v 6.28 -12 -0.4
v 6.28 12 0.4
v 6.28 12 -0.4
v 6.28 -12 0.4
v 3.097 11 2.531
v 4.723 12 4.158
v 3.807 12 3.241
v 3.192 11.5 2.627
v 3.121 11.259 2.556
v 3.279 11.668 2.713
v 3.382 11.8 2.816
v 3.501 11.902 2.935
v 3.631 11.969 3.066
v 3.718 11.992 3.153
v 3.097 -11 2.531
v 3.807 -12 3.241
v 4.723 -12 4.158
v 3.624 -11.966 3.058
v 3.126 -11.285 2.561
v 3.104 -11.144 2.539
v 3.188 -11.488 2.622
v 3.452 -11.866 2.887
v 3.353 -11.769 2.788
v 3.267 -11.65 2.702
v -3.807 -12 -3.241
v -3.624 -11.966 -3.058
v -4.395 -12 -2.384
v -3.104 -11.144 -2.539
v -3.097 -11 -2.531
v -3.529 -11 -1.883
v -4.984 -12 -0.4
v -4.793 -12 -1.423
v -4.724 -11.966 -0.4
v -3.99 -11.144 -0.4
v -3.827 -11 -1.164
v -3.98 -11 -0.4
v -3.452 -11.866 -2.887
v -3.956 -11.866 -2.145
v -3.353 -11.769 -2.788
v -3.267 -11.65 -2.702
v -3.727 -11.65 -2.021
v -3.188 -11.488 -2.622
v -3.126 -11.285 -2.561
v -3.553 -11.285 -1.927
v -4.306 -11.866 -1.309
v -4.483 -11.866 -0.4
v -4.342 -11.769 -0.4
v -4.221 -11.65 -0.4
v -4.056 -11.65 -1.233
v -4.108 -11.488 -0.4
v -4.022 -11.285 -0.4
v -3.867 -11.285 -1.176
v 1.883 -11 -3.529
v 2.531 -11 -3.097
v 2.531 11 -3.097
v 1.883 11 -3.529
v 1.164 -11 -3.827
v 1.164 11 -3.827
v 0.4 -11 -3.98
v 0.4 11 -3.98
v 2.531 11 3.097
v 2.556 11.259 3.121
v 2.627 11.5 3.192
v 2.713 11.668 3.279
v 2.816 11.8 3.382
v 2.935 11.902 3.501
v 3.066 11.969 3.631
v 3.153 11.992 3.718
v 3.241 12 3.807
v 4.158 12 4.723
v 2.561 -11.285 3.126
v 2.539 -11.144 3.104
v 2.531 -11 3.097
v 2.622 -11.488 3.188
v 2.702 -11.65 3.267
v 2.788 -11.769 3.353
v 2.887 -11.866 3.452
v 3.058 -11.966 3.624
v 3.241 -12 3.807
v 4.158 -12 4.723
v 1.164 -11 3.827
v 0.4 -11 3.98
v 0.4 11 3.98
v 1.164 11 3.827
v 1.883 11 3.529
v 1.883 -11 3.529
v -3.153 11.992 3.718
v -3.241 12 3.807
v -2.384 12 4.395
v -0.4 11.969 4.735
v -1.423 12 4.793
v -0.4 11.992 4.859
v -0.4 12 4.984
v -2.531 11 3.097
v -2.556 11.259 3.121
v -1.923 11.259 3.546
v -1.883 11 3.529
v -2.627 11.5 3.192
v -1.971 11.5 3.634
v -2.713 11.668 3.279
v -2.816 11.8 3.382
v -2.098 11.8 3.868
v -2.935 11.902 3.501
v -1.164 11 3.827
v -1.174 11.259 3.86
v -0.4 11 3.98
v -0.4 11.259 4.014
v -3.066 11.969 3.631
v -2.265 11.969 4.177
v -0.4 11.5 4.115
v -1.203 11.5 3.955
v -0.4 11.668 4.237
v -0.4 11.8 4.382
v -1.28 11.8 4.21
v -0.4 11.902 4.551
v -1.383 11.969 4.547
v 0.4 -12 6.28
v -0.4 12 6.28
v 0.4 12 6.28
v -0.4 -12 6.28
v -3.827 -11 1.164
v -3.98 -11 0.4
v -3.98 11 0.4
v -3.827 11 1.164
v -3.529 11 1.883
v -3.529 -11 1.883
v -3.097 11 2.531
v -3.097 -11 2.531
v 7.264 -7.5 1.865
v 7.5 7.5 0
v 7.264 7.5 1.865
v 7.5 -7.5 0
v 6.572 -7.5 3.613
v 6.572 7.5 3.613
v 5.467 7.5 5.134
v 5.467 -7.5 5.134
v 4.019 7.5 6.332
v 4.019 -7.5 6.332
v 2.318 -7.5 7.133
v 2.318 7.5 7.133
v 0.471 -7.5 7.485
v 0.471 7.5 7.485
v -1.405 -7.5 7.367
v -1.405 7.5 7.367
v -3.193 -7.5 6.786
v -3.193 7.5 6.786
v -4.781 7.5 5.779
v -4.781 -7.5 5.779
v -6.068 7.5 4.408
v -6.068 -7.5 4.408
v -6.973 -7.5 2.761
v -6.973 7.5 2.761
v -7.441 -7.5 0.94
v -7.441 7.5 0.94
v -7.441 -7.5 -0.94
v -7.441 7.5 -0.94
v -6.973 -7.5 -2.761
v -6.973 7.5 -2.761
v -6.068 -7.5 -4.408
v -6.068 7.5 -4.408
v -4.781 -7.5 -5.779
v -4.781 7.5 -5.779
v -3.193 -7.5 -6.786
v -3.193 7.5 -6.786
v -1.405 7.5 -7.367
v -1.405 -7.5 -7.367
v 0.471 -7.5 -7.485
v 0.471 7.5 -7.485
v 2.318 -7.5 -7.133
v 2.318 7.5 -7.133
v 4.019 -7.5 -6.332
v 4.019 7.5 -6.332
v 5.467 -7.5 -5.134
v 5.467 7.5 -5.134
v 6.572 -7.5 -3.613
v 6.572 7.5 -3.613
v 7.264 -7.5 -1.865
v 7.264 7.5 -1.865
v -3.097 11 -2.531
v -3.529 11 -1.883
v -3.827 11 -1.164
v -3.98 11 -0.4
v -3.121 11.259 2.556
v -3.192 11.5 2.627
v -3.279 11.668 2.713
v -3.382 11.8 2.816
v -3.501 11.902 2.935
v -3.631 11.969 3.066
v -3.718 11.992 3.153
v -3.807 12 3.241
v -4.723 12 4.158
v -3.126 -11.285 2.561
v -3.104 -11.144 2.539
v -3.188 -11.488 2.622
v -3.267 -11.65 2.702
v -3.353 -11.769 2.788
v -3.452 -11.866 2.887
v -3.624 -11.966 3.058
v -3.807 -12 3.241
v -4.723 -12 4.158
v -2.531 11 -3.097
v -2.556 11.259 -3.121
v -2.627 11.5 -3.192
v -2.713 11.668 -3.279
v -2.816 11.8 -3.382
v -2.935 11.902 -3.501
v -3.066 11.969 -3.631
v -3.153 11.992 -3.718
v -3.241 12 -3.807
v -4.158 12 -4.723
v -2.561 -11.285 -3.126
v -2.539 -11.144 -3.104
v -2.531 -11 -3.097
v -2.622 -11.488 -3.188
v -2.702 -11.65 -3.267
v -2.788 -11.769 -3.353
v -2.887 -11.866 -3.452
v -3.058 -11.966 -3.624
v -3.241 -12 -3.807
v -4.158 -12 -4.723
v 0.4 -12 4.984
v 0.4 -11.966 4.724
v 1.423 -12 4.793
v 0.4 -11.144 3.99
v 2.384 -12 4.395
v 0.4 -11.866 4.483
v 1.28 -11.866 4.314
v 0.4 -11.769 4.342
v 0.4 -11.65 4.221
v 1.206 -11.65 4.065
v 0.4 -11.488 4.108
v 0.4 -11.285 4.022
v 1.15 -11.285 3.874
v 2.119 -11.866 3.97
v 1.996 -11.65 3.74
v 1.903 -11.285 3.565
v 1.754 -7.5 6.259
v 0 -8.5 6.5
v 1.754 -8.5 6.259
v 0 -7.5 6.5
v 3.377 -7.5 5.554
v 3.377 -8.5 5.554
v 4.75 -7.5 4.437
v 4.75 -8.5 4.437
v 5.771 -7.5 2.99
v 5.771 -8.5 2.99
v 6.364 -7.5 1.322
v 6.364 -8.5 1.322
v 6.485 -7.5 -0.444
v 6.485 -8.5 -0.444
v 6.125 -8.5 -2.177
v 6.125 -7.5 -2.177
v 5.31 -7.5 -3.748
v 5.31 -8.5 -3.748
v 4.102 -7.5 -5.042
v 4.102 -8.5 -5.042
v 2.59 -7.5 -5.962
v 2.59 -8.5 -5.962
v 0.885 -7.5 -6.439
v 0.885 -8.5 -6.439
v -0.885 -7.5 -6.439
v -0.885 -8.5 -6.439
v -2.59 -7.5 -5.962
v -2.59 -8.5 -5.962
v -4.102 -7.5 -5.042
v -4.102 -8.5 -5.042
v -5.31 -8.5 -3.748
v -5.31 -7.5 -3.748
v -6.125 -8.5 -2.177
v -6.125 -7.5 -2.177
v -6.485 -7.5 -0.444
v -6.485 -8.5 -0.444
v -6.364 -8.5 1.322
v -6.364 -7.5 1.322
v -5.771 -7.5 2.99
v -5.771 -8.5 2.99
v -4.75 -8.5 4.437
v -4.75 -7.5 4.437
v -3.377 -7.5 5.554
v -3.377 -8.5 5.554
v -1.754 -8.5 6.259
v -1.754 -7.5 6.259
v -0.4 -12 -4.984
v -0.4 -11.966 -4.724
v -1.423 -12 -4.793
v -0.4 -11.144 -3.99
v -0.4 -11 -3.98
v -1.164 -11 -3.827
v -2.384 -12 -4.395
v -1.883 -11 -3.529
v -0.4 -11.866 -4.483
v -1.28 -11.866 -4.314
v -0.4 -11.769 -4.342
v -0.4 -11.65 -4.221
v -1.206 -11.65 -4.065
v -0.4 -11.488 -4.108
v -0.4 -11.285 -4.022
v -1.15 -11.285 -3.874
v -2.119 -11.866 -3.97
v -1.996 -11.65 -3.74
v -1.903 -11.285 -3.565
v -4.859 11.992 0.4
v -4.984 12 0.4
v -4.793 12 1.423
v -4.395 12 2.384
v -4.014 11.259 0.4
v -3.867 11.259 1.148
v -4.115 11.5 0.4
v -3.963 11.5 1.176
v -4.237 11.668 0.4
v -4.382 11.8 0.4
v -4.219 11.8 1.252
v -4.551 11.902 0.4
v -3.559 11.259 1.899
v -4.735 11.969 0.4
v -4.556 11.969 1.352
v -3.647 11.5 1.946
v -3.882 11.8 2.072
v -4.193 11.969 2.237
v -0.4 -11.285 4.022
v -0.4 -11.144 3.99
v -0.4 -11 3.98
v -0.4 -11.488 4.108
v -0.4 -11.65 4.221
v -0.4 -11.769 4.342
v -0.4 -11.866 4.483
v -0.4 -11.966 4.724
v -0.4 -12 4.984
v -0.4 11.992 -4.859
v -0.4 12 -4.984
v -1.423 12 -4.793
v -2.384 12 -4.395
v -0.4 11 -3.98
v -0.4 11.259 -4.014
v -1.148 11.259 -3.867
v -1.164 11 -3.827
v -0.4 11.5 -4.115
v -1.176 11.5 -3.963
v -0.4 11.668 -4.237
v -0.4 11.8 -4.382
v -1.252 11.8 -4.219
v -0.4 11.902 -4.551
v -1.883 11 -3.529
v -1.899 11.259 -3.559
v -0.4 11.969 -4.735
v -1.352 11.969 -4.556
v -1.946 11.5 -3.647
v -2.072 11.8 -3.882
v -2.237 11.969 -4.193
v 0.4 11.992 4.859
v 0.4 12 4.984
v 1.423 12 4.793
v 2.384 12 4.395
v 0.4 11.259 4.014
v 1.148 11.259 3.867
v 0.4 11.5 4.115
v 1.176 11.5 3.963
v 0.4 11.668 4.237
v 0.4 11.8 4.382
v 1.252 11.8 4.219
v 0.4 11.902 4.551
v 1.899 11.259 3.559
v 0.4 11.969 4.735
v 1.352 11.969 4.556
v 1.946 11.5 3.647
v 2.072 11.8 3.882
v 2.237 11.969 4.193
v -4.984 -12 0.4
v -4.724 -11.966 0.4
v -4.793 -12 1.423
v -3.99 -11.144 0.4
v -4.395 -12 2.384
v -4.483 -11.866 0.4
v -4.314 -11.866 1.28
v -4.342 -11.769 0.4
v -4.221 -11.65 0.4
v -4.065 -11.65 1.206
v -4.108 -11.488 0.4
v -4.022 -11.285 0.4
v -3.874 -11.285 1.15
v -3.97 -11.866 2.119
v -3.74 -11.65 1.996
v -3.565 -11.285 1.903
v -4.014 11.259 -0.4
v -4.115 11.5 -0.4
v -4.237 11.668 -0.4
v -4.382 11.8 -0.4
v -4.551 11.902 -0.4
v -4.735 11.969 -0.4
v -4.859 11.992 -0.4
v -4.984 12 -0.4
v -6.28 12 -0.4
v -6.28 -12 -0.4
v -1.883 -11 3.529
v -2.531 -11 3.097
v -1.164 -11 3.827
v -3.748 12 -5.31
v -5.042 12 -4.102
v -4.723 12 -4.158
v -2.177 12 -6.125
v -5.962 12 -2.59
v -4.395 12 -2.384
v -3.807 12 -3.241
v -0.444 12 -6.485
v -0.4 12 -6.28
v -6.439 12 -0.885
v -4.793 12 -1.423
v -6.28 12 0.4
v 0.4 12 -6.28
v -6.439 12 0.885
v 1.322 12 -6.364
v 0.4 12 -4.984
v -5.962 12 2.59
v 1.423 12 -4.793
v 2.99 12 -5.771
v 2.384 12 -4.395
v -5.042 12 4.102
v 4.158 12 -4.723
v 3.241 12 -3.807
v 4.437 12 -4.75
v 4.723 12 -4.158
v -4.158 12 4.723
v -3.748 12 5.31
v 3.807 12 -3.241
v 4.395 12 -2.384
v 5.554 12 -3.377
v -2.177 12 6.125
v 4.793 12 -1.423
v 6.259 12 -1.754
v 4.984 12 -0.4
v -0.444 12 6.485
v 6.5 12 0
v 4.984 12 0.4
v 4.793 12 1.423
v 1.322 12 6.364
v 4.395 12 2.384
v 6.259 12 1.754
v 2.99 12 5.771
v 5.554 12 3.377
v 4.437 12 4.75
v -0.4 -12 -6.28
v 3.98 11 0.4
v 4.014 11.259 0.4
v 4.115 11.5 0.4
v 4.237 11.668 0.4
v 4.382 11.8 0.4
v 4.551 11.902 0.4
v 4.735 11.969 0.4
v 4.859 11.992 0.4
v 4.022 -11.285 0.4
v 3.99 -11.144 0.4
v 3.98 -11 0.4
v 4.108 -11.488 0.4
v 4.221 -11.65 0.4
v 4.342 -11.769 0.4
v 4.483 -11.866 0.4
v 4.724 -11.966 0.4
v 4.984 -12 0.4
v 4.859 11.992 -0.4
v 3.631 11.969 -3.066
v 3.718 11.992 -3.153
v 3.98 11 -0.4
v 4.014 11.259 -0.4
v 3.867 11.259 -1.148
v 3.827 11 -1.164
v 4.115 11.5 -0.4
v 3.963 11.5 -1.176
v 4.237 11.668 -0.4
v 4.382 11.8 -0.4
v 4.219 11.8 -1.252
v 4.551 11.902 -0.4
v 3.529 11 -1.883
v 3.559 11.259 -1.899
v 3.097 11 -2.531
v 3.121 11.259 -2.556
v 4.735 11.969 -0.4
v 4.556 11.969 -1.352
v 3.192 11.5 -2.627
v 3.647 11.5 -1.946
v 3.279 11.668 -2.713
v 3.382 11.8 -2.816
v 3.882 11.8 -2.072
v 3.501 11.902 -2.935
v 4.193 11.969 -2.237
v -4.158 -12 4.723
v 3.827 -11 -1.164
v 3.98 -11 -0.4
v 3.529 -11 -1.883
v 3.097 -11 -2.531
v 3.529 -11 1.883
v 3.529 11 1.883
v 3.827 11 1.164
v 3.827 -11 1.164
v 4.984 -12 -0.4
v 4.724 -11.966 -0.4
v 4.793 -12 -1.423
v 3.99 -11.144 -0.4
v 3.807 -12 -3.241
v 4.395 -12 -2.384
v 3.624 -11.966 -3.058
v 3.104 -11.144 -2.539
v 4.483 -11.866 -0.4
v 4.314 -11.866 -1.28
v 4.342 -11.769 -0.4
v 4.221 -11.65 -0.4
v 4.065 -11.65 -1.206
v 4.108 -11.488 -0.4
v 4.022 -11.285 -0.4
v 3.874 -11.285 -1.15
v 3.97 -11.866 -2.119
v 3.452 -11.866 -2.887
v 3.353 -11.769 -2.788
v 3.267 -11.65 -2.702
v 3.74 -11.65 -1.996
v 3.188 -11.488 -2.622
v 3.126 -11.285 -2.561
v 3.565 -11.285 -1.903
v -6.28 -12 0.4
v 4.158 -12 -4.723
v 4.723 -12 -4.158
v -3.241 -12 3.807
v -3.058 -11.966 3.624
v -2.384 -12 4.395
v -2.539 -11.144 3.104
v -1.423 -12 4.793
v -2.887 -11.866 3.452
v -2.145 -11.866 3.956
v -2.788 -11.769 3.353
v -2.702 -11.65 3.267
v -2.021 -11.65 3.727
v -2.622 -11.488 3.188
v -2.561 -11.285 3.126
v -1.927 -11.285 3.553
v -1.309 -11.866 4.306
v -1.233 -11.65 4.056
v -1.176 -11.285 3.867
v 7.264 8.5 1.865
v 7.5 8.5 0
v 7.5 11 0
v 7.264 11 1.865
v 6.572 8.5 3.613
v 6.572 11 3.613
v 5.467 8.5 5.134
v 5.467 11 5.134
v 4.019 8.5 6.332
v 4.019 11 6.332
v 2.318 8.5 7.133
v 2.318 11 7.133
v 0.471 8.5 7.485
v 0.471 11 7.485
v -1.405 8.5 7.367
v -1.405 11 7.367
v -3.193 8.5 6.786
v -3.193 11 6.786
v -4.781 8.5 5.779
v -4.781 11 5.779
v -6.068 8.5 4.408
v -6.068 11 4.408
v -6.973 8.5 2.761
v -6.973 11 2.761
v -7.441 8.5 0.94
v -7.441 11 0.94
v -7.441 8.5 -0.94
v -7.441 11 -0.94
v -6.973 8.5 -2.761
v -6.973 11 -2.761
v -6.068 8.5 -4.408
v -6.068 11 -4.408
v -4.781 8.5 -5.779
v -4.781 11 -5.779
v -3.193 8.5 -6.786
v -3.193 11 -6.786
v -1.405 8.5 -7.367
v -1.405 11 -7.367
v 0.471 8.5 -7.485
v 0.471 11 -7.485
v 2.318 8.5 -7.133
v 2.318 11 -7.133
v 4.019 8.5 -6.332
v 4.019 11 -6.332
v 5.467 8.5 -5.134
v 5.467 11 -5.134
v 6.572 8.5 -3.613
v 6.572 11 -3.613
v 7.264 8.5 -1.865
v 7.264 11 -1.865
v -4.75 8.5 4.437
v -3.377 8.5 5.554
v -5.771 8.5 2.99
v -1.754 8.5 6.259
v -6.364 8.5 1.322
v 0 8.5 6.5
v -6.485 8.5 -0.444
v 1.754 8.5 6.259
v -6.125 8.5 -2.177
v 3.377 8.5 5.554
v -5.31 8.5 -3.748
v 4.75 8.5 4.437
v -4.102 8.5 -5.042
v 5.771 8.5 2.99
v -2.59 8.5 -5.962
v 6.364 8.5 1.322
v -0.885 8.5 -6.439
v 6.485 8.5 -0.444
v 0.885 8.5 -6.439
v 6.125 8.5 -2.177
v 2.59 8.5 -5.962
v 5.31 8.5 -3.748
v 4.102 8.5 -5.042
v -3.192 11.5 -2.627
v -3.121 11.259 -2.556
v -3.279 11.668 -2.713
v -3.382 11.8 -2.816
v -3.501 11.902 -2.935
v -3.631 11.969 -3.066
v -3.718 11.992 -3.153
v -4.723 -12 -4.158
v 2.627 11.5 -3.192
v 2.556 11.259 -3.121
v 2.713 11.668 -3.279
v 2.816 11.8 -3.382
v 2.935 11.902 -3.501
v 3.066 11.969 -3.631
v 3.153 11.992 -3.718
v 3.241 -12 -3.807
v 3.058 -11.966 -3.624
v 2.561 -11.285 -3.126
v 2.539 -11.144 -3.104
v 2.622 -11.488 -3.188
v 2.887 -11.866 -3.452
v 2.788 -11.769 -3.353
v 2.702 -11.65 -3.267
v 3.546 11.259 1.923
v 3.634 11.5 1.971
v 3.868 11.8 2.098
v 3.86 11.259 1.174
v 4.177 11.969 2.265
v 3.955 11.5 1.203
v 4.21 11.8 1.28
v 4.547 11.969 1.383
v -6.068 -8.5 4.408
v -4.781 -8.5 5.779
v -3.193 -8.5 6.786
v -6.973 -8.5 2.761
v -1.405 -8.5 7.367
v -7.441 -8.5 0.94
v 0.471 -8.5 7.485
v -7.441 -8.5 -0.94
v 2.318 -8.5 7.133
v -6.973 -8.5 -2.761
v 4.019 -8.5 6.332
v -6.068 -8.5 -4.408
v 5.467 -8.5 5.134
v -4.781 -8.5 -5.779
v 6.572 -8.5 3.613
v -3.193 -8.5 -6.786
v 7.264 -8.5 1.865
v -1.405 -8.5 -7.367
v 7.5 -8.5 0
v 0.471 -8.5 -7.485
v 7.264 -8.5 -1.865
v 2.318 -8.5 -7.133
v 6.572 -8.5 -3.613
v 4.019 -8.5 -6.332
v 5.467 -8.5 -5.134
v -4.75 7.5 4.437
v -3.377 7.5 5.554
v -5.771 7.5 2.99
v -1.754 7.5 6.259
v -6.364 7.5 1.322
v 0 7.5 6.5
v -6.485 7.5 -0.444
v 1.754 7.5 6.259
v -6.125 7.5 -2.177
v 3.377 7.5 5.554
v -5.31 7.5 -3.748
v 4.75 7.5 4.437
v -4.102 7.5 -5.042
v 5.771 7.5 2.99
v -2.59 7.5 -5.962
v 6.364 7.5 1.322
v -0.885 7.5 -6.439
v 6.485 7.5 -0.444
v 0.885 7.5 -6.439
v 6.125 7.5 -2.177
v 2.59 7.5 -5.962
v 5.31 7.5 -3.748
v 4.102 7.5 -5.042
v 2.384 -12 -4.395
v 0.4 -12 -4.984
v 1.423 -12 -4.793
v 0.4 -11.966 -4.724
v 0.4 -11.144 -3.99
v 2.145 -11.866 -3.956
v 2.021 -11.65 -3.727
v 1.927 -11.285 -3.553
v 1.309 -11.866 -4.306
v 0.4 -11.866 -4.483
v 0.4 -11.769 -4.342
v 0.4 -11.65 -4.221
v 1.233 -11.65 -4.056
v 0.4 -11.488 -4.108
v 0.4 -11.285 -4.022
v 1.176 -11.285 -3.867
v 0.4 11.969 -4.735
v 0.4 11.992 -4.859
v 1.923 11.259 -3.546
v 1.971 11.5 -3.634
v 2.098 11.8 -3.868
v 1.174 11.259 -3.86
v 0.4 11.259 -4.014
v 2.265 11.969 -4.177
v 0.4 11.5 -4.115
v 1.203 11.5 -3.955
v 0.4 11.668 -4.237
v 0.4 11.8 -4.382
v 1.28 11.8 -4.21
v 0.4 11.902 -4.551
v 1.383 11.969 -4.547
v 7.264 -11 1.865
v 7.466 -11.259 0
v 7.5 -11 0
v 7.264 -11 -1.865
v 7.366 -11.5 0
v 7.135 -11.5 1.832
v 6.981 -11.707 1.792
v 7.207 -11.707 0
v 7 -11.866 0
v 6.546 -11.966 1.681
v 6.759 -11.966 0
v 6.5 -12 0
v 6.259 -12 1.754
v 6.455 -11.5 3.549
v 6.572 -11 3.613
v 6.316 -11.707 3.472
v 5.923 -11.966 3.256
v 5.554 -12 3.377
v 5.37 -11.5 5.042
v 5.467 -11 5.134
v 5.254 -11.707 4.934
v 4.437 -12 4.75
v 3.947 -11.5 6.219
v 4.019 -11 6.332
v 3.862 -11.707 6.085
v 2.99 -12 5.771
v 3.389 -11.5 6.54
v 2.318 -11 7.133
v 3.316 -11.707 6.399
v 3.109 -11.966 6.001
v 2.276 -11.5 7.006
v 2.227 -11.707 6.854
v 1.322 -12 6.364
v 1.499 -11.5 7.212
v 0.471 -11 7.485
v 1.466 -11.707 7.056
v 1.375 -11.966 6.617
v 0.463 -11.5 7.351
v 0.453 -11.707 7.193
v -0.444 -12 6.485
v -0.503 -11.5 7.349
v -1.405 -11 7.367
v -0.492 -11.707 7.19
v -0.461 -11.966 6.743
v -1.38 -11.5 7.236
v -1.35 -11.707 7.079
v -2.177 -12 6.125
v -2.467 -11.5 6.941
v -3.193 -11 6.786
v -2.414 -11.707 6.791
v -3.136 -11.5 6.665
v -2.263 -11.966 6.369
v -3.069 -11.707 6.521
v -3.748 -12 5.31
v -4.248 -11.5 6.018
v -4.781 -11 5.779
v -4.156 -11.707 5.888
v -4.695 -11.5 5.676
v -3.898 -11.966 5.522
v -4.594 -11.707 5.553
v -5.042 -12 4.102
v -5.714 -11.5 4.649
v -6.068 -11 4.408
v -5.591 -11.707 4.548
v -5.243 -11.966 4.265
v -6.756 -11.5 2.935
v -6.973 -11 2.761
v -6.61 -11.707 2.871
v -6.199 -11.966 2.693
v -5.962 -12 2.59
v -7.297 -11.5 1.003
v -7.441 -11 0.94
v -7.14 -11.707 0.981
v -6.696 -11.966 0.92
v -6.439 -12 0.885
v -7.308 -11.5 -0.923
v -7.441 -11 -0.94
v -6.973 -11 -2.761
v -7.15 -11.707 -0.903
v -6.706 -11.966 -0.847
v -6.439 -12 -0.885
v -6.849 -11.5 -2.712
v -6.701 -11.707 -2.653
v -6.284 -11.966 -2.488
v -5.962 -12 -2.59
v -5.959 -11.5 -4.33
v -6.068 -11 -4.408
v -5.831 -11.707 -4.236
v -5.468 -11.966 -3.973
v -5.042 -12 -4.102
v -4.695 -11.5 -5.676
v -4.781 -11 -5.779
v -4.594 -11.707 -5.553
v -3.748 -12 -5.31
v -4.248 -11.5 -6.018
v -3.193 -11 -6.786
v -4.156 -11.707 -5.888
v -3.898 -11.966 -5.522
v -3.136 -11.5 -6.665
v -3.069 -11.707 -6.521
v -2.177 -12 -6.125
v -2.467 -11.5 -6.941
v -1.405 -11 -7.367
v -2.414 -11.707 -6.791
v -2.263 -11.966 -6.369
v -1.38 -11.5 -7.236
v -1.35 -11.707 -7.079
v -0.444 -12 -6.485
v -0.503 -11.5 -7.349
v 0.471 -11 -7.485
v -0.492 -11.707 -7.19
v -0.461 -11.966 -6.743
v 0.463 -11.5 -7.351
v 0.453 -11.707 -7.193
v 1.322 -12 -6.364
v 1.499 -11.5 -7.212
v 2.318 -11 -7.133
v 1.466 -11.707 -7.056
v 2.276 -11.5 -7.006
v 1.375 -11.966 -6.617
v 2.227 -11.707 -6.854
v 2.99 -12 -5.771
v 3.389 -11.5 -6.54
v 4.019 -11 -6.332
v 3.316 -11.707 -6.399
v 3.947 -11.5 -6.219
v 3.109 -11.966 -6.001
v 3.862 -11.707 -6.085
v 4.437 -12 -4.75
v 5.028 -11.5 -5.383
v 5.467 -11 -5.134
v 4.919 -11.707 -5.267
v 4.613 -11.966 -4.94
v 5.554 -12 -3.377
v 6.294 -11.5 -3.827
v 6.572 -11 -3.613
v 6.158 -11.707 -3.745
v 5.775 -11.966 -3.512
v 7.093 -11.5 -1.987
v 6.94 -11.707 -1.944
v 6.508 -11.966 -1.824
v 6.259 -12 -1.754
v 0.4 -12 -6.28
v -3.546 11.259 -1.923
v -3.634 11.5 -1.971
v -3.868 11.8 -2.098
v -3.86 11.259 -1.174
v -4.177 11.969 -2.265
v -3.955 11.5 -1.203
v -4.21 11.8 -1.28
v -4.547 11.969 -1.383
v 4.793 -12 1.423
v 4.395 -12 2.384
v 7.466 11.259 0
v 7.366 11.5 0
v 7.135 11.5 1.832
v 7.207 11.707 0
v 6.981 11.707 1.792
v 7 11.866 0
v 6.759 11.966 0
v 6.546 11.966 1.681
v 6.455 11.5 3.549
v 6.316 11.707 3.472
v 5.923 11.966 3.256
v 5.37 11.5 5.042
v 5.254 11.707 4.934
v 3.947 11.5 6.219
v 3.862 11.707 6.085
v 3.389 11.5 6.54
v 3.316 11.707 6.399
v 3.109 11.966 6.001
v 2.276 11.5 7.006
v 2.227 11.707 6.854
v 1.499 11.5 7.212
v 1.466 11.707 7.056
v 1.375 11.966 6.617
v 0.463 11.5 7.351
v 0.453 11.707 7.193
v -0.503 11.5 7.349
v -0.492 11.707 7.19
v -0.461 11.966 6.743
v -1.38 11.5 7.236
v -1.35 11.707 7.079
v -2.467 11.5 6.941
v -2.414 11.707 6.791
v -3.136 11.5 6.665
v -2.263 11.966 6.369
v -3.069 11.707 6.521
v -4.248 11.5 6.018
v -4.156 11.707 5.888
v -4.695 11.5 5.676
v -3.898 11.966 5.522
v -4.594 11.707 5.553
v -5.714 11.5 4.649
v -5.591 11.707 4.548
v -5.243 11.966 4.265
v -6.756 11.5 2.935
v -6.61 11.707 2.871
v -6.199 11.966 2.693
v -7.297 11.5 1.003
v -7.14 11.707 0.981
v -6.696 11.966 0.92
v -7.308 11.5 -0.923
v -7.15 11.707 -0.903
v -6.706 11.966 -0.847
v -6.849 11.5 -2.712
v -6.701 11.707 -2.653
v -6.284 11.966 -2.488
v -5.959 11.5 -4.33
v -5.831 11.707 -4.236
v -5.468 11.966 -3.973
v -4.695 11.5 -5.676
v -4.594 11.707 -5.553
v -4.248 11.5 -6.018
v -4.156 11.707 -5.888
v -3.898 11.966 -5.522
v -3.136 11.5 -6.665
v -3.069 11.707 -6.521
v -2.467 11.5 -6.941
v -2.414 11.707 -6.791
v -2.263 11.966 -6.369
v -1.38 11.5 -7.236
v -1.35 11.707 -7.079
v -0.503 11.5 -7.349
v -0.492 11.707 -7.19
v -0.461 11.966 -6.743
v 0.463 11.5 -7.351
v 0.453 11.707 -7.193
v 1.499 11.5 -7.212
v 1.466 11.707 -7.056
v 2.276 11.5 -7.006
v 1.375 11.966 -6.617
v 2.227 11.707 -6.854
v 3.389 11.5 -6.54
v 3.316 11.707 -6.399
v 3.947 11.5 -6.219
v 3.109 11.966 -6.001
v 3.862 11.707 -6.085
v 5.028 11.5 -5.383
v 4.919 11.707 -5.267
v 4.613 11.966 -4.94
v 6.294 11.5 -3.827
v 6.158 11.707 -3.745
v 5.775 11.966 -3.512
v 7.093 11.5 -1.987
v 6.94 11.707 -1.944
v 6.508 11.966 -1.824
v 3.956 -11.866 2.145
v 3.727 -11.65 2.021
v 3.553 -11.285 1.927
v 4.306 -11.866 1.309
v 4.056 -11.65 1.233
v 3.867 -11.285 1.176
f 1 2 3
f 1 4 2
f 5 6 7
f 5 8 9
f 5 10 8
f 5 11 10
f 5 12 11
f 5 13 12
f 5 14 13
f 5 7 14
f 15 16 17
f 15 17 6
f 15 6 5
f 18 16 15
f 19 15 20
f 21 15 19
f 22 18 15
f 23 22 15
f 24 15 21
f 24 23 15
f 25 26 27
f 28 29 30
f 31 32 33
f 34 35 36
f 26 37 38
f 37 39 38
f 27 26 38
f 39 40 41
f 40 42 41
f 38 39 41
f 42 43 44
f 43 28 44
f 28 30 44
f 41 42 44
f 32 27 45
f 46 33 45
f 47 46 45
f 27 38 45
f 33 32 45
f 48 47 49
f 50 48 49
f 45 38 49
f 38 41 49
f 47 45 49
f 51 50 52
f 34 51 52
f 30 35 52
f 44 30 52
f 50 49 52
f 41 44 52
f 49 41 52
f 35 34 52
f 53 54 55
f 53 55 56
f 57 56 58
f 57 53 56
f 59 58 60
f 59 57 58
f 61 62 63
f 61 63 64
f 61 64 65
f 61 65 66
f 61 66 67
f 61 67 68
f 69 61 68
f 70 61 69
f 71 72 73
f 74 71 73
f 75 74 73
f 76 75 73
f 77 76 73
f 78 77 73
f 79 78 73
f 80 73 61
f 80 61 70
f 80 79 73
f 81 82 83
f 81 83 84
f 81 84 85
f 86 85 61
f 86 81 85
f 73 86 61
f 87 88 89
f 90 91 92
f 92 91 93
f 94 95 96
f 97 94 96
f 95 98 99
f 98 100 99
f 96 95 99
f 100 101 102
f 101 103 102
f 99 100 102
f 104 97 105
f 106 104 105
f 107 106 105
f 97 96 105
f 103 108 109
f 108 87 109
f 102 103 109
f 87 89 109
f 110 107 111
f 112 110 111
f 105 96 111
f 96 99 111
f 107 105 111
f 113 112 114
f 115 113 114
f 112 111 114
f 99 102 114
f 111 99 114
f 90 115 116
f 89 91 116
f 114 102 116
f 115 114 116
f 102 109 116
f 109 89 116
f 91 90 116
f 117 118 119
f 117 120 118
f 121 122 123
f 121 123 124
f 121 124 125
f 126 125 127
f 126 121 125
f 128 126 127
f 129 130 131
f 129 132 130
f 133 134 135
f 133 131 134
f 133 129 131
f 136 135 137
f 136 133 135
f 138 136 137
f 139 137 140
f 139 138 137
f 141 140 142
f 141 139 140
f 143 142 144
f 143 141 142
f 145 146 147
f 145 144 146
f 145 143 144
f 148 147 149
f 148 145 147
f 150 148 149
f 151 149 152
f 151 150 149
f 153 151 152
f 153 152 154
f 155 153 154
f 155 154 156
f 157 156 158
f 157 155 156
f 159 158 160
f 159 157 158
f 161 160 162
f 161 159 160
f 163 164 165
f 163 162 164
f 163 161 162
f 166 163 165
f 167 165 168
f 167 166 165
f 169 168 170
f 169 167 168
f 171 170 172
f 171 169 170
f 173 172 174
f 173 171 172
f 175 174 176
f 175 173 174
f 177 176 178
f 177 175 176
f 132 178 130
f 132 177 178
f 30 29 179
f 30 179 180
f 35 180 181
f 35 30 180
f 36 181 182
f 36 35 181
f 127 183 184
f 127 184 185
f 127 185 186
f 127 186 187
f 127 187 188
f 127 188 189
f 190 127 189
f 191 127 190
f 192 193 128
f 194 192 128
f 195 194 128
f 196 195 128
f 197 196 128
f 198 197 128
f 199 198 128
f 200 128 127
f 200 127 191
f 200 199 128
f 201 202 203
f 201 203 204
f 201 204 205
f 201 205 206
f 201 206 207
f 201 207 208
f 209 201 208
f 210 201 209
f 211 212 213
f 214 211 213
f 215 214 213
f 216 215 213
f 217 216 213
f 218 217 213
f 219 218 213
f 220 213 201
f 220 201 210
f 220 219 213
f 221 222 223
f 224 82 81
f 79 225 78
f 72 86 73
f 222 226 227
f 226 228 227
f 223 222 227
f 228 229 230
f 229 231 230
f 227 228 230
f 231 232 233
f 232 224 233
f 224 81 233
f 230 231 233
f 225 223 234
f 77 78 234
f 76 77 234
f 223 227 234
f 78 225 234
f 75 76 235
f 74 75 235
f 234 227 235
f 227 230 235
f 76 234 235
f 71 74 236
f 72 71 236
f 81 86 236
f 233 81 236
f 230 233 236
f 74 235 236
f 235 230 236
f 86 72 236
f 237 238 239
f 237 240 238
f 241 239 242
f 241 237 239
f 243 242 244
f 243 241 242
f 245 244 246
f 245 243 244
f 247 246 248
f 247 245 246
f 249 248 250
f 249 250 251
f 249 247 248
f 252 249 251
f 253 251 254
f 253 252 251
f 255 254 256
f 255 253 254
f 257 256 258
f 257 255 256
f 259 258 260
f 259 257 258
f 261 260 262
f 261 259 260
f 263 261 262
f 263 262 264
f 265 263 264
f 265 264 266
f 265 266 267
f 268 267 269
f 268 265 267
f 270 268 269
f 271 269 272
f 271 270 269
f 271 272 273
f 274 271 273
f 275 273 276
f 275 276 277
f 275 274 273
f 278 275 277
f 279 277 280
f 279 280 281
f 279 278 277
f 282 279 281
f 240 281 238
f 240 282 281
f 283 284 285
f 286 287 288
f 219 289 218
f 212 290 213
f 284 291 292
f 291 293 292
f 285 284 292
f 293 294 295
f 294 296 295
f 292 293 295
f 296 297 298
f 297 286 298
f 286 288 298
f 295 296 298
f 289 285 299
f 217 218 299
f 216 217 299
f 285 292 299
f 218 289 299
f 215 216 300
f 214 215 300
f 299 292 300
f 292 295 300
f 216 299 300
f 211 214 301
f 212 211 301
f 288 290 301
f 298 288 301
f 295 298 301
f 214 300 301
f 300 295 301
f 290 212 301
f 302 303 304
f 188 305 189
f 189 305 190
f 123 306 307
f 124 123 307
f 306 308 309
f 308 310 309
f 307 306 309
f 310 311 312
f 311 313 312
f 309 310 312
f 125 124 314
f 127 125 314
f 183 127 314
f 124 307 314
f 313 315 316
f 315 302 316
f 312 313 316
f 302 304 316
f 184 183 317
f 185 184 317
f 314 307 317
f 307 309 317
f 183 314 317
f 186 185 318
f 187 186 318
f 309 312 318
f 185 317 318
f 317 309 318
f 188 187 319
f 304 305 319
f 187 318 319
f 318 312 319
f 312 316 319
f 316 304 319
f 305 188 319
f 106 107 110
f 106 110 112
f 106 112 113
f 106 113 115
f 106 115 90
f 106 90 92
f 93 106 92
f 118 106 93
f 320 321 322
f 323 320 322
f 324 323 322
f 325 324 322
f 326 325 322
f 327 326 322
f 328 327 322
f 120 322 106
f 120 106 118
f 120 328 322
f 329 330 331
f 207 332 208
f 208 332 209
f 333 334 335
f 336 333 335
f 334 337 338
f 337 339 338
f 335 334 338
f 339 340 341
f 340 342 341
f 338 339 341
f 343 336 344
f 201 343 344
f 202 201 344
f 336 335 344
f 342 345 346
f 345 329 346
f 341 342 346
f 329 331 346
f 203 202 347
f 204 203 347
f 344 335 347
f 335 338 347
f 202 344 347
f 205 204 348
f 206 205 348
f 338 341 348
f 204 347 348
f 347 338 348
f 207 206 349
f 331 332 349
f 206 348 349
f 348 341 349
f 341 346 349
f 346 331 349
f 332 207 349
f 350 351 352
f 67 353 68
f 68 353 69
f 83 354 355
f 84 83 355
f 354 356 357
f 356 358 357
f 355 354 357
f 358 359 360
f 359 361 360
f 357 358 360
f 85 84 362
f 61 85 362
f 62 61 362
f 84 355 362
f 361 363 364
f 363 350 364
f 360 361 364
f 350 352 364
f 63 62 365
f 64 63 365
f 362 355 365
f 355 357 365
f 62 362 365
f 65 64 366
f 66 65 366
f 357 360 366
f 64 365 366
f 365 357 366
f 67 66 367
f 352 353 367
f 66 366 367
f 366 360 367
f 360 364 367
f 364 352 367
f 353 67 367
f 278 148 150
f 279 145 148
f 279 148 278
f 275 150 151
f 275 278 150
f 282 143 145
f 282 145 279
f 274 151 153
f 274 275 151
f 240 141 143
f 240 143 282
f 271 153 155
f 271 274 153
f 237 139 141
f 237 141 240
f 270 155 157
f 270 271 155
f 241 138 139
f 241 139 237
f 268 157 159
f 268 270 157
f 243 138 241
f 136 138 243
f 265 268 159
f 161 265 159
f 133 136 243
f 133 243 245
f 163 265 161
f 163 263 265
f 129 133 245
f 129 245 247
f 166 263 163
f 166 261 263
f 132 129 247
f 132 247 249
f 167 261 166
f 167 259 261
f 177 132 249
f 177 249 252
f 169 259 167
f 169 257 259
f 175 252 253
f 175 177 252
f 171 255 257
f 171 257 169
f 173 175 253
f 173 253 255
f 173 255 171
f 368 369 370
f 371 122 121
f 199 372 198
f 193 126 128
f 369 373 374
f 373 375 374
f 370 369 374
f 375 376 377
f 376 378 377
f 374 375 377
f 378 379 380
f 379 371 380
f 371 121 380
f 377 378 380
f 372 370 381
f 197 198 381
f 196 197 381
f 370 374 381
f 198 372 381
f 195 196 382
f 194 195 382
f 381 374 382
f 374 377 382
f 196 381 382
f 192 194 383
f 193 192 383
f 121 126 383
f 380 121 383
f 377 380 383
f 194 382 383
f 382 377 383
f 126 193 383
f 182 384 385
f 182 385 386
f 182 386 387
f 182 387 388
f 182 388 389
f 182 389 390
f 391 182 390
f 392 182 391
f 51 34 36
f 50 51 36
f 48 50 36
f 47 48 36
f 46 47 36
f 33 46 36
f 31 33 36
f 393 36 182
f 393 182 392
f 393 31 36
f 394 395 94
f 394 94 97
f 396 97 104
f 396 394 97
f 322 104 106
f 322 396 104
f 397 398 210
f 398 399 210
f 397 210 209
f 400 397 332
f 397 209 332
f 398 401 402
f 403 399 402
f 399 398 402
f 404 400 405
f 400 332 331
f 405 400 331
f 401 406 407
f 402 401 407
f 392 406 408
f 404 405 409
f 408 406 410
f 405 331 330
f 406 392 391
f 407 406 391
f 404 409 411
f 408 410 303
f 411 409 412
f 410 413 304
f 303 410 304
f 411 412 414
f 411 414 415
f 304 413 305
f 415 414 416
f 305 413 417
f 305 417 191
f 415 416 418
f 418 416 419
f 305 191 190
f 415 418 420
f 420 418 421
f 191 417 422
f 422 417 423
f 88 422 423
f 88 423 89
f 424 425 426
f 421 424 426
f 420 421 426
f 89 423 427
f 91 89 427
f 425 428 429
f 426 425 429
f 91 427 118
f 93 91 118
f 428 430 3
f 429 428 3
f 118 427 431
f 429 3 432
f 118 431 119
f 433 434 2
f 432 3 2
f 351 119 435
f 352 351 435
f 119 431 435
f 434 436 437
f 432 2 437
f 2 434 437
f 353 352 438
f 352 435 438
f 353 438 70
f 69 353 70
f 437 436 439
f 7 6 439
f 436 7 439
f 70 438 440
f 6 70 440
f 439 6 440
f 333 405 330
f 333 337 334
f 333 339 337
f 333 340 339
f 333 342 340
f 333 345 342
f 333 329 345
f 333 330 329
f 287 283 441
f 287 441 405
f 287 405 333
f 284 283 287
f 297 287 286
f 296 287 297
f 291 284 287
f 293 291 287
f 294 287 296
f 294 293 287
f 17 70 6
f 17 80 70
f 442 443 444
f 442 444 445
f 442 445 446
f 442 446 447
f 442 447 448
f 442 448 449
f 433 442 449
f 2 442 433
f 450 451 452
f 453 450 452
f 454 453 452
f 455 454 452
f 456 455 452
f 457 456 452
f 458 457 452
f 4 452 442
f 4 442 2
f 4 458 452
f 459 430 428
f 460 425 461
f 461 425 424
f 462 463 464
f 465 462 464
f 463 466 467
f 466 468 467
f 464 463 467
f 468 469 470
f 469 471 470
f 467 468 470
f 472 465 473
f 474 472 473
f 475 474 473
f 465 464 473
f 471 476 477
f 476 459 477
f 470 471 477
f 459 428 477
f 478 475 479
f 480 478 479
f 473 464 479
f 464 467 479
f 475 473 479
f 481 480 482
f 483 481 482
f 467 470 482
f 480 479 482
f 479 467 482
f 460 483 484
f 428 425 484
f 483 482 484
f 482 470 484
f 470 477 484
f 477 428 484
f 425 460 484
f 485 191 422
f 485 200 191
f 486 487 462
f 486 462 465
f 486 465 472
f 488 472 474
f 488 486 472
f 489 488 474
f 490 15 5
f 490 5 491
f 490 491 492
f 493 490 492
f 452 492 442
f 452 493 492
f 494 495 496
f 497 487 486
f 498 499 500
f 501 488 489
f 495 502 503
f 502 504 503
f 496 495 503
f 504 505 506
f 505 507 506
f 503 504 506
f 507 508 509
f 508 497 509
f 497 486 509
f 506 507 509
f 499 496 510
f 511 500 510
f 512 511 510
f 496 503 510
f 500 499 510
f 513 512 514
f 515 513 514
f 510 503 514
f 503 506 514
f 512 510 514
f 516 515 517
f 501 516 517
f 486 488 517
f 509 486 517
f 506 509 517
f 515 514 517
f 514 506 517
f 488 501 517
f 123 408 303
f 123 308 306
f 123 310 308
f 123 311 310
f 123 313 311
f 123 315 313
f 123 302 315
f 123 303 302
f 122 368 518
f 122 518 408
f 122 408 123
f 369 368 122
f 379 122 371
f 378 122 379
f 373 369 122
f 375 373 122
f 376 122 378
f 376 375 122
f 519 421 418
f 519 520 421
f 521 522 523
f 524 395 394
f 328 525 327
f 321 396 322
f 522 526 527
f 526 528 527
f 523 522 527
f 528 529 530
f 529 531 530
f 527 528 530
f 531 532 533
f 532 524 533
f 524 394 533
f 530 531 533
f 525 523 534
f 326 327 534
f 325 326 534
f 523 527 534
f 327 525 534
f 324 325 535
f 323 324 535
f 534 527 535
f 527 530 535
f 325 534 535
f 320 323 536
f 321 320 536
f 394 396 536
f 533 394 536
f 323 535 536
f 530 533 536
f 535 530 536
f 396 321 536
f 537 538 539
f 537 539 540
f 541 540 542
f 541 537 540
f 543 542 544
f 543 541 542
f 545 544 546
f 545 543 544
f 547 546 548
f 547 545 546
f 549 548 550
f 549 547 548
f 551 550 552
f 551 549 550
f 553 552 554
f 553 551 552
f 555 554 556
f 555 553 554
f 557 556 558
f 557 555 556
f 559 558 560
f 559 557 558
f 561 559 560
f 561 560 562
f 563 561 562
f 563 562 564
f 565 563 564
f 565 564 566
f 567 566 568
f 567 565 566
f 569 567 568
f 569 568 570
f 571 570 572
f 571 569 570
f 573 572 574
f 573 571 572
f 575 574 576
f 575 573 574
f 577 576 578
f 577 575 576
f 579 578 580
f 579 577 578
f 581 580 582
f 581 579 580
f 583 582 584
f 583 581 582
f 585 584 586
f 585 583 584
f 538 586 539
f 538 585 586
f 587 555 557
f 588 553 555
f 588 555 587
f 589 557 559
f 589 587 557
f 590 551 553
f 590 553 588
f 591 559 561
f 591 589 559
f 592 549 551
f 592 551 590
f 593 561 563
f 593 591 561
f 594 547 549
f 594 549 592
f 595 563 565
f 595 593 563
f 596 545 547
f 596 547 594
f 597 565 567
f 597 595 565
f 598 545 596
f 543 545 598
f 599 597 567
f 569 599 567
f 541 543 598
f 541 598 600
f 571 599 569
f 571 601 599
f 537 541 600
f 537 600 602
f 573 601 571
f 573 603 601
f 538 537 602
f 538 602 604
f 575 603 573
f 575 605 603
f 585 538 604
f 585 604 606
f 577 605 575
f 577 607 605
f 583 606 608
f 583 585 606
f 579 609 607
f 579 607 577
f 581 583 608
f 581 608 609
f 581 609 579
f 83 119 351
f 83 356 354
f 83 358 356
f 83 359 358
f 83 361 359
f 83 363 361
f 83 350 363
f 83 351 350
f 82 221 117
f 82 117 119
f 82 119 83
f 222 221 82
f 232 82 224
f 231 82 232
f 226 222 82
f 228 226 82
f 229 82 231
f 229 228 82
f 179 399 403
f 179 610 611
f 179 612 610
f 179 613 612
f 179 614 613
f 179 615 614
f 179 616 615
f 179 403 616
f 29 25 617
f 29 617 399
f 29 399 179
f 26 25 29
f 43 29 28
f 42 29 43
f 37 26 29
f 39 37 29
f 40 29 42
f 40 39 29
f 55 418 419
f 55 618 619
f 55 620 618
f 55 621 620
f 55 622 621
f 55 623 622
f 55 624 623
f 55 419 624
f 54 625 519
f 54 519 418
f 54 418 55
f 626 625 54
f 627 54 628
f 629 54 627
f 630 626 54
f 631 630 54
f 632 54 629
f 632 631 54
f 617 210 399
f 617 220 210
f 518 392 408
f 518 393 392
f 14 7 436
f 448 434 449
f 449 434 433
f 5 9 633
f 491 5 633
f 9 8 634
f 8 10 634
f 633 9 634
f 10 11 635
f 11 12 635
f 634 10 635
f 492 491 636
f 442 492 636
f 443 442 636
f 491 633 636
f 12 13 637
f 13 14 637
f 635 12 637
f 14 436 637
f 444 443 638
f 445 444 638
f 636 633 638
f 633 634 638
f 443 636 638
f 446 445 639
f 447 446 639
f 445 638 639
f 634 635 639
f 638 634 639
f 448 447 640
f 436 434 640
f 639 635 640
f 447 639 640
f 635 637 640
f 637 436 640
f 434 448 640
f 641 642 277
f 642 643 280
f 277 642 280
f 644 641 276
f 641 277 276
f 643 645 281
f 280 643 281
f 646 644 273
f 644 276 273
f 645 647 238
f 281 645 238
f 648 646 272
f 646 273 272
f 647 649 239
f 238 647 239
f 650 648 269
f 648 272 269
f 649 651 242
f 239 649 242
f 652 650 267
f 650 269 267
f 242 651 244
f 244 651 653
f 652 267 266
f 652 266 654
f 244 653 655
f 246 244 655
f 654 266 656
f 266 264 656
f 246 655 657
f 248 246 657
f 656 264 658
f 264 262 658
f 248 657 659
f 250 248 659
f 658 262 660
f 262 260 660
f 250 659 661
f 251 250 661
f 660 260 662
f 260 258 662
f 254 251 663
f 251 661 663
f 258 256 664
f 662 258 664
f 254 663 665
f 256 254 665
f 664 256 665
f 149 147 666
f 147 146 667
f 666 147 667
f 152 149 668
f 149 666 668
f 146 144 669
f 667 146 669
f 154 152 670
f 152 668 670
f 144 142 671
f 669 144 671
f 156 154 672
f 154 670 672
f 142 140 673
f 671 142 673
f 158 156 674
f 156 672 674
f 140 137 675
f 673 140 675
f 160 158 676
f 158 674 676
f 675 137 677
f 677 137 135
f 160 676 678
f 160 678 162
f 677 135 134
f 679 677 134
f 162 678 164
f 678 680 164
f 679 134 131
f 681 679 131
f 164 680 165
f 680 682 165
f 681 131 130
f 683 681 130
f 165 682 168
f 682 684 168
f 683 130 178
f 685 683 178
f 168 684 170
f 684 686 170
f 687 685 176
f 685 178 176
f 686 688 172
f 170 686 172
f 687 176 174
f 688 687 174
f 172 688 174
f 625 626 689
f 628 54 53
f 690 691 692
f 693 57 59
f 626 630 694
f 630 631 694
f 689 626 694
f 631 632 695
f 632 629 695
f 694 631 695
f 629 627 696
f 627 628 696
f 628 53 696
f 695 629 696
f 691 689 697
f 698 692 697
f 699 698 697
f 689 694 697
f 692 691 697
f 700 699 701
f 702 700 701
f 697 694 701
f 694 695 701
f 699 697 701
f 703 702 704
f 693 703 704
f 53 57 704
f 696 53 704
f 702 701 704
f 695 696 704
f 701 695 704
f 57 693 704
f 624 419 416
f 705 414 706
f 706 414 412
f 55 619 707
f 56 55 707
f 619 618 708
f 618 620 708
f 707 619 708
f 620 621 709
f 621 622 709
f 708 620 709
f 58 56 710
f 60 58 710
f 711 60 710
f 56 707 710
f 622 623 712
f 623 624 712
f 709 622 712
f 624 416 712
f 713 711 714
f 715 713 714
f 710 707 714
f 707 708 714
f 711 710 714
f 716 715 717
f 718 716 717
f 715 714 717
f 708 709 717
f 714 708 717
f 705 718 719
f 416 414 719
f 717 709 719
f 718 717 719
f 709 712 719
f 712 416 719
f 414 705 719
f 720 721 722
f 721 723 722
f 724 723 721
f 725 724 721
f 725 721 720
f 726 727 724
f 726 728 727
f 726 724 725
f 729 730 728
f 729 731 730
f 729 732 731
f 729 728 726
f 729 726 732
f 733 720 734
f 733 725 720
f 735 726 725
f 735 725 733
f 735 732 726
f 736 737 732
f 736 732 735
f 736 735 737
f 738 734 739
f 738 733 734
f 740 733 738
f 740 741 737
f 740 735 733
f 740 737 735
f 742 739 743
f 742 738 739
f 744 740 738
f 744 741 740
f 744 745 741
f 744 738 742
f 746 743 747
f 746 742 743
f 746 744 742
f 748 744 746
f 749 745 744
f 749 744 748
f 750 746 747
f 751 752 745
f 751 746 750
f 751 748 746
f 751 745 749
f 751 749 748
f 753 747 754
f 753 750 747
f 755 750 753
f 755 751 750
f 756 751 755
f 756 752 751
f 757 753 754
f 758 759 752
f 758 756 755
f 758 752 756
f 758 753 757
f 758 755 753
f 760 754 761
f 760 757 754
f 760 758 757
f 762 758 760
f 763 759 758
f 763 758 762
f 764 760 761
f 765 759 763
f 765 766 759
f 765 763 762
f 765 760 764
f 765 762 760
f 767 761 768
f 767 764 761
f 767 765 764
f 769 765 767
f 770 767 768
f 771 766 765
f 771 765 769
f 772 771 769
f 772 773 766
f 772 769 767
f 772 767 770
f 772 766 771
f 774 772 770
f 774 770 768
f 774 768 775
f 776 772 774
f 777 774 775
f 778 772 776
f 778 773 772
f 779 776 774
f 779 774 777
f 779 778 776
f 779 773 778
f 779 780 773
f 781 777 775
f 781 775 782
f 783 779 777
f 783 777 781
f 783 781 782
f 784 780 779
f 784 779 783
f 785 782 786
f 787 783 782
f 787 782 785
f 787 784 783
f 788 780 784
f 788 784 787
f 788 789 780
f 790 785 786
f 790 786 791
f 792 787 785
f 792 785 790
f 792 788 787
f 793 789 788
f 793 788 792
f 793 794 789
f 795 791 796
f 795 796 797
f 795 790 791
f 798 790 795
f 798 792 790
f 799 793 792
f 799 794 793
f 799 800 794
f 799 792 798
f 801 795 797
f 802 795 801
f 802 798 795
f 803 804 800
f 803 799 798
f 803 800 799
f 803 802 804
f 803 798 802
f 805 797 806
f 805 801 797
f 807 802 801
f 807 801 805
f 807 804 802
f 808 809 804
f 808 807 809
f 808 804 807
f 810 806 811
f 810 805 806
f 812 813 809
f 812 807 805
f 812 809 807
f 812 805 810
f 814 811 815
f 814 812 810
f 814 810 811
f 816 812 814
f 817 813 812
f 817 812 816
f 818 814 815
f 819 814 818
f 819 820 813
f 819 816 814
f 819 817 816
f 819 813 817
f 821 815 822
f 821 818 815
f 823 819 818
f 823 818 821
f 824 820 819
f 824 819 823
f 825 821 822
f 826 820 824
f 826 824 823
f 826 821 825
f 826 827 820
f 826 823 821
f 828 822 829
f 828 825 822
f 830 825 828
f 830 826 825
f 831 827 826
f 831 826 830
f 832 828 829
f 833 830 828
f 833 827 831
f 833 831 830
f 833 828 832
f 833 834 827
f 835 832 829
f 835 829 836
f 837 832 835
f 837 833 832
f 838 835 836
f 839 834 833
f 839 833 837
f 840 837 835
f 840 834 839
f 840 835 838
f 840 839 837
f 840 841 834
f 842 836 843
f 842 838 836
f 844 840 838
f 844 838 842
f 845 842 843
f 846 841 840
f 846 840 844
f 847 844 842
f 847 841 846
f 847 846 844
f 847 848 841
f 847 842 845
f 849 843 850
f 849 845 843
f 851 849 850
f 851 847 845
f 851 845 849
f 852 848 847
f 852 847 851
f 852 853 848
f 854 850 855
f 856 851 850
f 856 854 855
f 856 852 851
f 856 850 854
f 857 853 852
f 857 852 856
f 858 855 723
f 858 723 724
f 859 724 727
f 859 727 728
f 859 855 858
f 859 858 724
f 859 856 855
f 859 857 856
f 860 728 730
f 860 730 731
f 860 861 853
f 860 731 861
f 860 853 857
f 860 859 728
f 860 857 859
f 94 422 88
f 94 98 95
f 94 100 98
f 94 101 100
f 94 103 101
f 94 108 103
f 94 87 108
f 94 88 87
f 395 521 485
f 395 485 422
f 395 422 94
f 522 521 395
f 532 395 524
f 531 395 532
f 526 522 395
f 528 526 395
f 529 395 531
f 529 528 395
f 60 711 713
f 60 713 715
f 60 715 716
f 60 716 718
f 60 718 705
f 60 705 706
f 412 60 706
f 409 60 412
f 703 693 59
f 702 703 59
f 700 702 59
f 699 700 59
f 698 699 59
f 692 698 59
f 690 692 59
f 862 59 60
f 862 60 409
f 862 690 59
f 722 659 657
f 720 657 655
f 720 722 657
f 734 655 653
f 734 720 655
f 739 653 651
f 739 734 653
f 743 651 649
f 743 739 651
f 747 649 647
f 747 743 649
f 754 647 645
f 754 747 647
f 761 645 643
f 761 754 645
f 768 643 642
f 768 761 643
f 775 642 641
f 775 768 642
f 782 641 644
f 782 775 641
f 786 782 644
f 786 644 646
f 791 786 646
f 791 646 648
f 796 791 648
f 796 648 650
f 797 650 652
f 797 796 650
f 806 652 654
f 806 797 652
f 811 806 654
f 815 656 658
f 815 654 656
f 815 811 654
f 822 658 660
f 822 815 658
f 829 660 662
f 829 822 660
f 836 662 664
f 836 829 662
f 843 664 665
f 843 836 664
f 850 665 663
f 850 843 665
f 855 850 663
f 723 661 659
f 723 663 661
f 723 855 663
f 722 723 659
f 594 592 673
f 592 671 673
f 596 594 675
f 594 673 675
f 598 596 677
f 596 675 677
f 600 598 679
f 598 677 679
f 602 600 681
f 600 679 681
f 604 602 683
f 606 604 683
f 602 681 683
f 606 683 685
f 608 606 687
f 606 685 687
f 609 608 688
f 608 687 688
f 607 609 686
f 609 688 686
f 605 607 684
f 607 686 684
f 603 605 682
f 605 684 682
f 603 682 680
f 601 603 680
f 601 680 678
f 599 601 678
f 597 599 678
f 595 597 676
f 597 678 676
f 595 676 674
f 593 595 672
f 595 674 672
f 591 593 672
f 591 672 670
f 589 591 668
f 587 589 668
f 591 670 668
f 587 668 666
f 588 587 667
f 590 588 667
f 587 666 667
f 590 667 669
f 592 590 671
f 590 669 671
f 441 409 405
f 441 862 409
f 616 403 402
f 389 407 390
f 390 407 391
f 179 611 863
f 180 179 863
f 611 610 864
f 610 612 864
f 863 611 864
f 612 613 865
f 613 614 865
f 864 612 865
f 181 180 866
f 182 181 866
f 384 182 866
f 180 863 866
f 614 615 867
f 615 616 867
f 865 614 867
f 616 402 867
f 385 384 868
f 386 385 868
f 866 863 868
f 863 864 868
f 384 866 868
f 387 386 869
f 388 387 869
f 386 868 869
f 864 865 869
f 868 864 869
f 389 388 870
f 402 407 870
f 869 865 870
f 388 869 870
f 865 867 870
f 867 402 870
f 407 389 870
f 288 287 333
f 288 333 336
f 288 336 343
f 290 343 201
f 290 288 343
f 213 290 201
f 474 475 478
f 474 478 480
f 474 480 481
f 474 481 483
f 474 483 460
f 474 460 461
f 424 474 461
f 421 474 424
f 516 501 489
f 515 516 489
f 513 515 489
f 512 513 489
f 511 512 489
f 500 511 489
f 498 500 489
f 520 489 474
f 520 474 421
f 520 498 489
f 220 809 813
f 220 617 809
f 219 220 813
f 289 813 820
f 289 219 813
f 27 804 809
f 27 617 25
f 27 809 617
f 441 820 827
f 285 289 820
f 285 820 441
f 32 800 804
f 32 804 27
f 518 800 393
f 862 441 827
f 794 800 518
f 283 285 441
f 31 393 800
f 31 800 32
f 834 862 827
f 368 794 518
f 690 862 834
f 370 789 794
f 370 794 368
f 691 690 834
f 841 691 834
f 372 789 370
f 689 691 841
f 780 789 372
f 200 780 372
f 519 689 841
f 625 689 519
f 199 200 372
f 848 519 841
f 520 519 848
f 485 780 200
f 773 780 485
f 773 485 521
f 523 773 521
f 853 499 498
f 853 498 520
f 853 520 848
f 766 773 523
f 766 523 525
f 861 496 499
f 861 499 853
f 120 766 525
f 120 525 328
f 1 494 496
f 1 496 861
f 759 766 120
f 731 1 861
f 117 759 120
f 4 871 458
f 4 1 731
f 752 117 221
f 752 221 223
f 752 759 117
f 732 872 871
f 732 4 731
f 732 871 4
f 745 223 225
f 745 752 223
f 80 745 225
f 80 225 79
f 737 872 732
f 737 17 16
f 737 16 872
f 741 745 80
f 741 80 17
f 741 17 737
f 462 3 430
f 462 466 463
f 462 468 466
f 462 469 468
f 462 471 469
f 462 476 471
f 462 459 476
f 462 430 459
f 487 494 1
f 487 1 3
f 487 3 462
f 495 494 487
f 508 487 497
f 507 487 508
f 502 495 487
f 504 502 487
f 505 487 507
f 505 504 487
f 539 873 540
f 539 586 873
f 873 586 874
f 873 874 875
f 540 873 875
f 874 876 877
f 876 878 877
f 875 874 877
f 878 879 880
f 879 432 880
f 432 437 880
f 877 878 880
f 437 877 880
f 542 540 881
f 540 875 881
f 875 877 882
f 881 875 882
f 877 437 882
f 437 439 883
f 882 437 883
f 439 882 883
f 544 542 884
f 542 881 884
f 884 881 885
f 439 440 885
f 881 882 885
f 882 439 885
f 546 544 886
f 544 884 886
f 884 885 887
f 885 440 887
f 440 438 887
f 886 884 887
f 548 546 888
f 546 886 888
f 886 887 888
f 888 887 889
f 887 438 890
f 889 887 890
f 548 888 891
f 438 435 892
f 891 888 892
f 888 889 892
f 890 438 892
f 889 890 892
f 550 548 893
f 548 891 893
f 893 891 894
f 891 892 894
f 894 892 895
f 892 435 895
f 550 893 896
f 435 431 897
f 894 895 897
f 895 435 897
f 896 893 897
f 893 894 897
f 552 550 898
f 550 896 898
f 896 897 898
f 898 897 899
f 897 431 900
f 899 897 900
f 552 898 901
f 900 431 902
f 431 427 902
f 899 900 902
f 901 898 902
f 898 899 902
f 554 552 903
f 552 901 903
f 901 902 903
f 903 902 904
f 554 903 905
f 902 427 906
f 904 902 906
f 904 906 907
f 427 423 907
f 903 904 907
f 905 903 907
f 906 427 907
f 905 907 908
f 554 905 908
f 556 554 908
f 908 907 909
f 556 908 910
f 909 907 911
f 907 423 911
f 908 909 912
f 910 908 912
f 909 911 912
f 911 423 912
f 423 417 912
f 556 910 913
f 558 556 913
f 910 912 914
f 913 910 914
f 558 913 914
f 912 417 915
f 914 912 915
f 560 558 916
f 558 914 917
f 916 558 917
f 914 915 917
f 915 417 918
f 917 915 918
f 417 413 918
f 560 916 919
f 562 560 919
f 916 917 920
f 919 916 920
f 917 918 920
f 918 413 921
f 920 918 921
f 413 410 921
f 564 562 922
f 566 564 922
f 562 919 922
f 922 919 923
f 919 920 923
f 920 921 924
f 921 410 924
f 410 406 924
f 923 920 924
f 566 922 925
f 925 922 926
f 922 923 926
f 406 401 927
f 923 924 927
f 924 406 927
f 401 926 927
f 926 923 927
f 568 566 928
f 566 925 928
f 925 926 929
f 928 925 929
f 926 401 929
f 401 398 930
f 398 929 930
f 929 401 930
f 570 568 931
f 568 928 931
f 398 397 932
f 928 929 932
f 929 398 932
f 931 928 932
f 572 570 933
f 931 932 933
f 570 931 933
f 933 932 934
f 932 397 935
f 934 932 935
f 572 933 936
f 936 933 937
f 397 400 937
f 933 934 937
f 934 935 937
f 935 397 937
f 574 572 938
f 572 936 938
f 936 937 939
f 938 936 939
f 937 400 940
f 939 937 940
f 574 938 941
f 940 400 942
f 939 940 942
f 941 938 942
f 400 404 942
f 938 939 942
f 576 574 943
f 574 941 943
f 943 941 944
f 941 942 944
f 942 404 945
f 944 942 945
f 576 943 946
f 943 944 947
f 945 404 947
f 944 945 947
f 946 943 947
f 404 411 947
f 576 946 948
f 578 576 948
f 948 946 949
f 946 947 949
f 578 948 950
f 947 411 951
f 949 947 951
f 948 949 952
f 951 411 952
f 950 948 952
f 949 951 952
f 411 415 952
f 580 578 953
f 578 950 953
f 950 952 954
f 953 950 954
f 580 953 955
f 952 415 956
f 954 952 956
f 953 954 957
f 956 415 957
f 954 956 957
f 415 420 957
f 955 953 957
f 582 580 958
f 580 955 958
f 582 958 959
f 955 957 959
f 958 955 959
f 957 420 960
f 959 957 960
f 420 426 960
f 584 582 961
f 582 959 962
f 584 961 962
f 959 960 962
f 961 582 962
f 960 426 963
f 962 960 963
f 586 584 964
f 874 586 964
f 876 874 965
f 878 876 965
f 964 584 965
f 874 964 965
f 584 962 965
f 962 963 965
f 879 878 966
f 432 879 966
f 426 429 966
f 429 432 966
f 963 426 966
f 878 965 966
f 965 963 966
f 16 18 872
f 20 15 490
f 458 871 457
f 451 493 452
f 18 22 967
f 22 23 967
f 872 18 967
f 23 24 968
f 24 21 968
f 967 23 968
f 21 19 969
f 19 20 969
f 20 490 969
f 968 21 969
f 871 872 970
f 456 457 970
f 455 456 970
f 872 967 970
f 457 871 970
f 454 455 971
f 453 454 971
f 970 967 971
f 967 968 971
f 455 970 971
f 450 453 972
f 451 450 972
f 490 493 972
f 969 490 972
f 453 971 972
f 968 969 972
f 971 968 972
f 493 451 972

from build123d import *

# Parameters (mm, degrees)
F0_R     = 7.5
F1_DEPTH = 12
F2_R     = 1
F3_W     = 1
F3_H     = 1


# Not quite as in the source:
# - a pattern or mirror of a feature is missing from the dataset's text; its kind, count and spacing are read off the source's solid


with BuildPart() as f1:
    # F0 (on Front) → F1 (new body, symmetric)
    with BuildSketch(Plane.XZ):
        Circle(F0_R)
        with BuildLine():
            ThreePointArc((3.0970921684, 2.5314067434), (3.69551813, 1.5307337295), (3.9799497484, 0.4))
            Line((3.9799497484, 0.4), (6.2799497484, 0.4))
            Line((6.2799497484, 0.4), (6.2799497484, -0.4))
            Line((6.2799497484, -0.4), (3.9799497484, -0.4))
            ThreePointArc((3.9799497484, -0.4), (3.69551813, -1.5307337295), (3.0970921684, -2.5314067434))
            Line((3.0970921684, -2.5314067434), (4.7234377651, -4.1577523401))
            Line((4.7234377651, -4.1577523401), (4.1577523401, -4.7234377651))
            Line((4.1577523401, -4.7234377651), (2.5314067434, -3.0970921684))
            ThreePointArc((2.5314067434, -3.0970921684), (1.5307337295, -3.69551813), (0.4, -3.9799497484))
            Line((0.4, -3.9799497484), (0.4, -6.2799497484))
            Line((0.4, -6.2799497484), (-0.4, -6.2799497484))
            Line((-0.4, -6.2799497484), (-0.4, -3.9799497484))
            ThreePointArc((-0.4, -3.9799497484), (-1.5307337295, -3.69551813), (-2.5314067434, -3.0970921684))
            Line((-2.5314067434, -3.0970921684), (-4.1577523401, -4.7234377651))
            Line((-4.1577523401, -4.7234377651), (-4.7234377651, -4.1577523401))
            Line((-4.7234377651, -4.1577523401), (-3.0970921684, -2.5314067434))
            ThreePointArc((-3.0970921684, -2.5314067434), (-3.69551813, -1.5307337295), (-3.9799497484, -0.4))
            Line((-3.9799497484, -0.4), (-6.2799497484, -0.4))
            Line((-6.2799497484, -0.4), (-6.2799497484, 0.4))
            Line((-6.2799497484, 0.4), (-3.9799497484, 0.4))
            ThreePointArc((-3.9799497484, 0.4), (-3.69551813, 1.5307337295), (-3.0970921684, 2.5314067434))
            Line((-3.0970921684, 2.5314067434), (-4.7234377651, 4.1577523401))
            Line((-4.7234377651, 4.1577523401), (-4.1577523401, 4.7234377651))
            Line((-4.1577523401, 4.7234377651), (-2.5314067434, 3.0970921684))
            ThreePointArc((-2.5314067434, 3.0970921684), (-1.5307337295, 3.69551813), (-0.4, 3.9799497484))
            Line((-0.4, 3.9799497484), (-0.4, 6.2799497484))
            Line((-0.4, 6.2799497484), (0.4, 6.2799497484))
            Line((0.4, 6.2799497484), (0.4, 3.9799497484))
            ThreePointArc((0.4, 3.9799497484), (1.5307337295, 3.69551813), (2.5314067434, 3.0970921684))
            Line((2.5314067434, 3.0970921684), (4.1577523401, 4.7234377651))
            Line((4.1577523401, 4.7234377651), (4.7234377651, 4.1577523401))
            Line((4.7234377651, 4.1577523401), (3.0970921684, 2.5314067434))
        make_face(mode=Mode.SUBTRACT)
    extrude(amount=F1_DEPTH, both=True)

    # F2
    f2_edges = [f1.edges().sort_by_distance(p)[0] for p in [
        (-7.5, -12, 0),
        (-1.530734, -12, 3.695518),
        (-3.695518, -12, 1.530734),
        (-3.695518, -12, -1.530734),
        (-1.530734, -12, -3.695518),
        (1.530734, -12, -3.695518),
        (3.695518, -12, -1.530734),
        (3.695518, -12, 1.530734),
        (1.530734, -12, 3.695518),
        (-7.5, 12, 0),
        (3.695518, 12, -1.530734),
        (3.695518, 12, 1.530734),
        (1.530734, 12, 3.695518),
        (-1.530734, 12, 3.695518),
        (-3.695518, 12, 1.530734),
        (-3.695518, 12, -1.530734),
        (-1.530734, 12, -3.695518),
        (1.530734, 12, -3.695518),
    ]]
    fillet(f2_edges, radius=F2_R)

    # F3 (on Right) → F4 (revolve, cut)
    with BuildSketch(Plane.YZ):
        with Locations((-8, 7)):
            Rectangle(F3_W, F3_H)
    f4 = revolve(axis=Axis((0, 11.2657039426, 0), (0, 1, 0)), mode=Mode.SUBTRACT)

    # F4_copies: F4 across plane
    add(f4.mirror(Plane.ZX), mode=Mode.SUBTRACT)


solid = f1.part
